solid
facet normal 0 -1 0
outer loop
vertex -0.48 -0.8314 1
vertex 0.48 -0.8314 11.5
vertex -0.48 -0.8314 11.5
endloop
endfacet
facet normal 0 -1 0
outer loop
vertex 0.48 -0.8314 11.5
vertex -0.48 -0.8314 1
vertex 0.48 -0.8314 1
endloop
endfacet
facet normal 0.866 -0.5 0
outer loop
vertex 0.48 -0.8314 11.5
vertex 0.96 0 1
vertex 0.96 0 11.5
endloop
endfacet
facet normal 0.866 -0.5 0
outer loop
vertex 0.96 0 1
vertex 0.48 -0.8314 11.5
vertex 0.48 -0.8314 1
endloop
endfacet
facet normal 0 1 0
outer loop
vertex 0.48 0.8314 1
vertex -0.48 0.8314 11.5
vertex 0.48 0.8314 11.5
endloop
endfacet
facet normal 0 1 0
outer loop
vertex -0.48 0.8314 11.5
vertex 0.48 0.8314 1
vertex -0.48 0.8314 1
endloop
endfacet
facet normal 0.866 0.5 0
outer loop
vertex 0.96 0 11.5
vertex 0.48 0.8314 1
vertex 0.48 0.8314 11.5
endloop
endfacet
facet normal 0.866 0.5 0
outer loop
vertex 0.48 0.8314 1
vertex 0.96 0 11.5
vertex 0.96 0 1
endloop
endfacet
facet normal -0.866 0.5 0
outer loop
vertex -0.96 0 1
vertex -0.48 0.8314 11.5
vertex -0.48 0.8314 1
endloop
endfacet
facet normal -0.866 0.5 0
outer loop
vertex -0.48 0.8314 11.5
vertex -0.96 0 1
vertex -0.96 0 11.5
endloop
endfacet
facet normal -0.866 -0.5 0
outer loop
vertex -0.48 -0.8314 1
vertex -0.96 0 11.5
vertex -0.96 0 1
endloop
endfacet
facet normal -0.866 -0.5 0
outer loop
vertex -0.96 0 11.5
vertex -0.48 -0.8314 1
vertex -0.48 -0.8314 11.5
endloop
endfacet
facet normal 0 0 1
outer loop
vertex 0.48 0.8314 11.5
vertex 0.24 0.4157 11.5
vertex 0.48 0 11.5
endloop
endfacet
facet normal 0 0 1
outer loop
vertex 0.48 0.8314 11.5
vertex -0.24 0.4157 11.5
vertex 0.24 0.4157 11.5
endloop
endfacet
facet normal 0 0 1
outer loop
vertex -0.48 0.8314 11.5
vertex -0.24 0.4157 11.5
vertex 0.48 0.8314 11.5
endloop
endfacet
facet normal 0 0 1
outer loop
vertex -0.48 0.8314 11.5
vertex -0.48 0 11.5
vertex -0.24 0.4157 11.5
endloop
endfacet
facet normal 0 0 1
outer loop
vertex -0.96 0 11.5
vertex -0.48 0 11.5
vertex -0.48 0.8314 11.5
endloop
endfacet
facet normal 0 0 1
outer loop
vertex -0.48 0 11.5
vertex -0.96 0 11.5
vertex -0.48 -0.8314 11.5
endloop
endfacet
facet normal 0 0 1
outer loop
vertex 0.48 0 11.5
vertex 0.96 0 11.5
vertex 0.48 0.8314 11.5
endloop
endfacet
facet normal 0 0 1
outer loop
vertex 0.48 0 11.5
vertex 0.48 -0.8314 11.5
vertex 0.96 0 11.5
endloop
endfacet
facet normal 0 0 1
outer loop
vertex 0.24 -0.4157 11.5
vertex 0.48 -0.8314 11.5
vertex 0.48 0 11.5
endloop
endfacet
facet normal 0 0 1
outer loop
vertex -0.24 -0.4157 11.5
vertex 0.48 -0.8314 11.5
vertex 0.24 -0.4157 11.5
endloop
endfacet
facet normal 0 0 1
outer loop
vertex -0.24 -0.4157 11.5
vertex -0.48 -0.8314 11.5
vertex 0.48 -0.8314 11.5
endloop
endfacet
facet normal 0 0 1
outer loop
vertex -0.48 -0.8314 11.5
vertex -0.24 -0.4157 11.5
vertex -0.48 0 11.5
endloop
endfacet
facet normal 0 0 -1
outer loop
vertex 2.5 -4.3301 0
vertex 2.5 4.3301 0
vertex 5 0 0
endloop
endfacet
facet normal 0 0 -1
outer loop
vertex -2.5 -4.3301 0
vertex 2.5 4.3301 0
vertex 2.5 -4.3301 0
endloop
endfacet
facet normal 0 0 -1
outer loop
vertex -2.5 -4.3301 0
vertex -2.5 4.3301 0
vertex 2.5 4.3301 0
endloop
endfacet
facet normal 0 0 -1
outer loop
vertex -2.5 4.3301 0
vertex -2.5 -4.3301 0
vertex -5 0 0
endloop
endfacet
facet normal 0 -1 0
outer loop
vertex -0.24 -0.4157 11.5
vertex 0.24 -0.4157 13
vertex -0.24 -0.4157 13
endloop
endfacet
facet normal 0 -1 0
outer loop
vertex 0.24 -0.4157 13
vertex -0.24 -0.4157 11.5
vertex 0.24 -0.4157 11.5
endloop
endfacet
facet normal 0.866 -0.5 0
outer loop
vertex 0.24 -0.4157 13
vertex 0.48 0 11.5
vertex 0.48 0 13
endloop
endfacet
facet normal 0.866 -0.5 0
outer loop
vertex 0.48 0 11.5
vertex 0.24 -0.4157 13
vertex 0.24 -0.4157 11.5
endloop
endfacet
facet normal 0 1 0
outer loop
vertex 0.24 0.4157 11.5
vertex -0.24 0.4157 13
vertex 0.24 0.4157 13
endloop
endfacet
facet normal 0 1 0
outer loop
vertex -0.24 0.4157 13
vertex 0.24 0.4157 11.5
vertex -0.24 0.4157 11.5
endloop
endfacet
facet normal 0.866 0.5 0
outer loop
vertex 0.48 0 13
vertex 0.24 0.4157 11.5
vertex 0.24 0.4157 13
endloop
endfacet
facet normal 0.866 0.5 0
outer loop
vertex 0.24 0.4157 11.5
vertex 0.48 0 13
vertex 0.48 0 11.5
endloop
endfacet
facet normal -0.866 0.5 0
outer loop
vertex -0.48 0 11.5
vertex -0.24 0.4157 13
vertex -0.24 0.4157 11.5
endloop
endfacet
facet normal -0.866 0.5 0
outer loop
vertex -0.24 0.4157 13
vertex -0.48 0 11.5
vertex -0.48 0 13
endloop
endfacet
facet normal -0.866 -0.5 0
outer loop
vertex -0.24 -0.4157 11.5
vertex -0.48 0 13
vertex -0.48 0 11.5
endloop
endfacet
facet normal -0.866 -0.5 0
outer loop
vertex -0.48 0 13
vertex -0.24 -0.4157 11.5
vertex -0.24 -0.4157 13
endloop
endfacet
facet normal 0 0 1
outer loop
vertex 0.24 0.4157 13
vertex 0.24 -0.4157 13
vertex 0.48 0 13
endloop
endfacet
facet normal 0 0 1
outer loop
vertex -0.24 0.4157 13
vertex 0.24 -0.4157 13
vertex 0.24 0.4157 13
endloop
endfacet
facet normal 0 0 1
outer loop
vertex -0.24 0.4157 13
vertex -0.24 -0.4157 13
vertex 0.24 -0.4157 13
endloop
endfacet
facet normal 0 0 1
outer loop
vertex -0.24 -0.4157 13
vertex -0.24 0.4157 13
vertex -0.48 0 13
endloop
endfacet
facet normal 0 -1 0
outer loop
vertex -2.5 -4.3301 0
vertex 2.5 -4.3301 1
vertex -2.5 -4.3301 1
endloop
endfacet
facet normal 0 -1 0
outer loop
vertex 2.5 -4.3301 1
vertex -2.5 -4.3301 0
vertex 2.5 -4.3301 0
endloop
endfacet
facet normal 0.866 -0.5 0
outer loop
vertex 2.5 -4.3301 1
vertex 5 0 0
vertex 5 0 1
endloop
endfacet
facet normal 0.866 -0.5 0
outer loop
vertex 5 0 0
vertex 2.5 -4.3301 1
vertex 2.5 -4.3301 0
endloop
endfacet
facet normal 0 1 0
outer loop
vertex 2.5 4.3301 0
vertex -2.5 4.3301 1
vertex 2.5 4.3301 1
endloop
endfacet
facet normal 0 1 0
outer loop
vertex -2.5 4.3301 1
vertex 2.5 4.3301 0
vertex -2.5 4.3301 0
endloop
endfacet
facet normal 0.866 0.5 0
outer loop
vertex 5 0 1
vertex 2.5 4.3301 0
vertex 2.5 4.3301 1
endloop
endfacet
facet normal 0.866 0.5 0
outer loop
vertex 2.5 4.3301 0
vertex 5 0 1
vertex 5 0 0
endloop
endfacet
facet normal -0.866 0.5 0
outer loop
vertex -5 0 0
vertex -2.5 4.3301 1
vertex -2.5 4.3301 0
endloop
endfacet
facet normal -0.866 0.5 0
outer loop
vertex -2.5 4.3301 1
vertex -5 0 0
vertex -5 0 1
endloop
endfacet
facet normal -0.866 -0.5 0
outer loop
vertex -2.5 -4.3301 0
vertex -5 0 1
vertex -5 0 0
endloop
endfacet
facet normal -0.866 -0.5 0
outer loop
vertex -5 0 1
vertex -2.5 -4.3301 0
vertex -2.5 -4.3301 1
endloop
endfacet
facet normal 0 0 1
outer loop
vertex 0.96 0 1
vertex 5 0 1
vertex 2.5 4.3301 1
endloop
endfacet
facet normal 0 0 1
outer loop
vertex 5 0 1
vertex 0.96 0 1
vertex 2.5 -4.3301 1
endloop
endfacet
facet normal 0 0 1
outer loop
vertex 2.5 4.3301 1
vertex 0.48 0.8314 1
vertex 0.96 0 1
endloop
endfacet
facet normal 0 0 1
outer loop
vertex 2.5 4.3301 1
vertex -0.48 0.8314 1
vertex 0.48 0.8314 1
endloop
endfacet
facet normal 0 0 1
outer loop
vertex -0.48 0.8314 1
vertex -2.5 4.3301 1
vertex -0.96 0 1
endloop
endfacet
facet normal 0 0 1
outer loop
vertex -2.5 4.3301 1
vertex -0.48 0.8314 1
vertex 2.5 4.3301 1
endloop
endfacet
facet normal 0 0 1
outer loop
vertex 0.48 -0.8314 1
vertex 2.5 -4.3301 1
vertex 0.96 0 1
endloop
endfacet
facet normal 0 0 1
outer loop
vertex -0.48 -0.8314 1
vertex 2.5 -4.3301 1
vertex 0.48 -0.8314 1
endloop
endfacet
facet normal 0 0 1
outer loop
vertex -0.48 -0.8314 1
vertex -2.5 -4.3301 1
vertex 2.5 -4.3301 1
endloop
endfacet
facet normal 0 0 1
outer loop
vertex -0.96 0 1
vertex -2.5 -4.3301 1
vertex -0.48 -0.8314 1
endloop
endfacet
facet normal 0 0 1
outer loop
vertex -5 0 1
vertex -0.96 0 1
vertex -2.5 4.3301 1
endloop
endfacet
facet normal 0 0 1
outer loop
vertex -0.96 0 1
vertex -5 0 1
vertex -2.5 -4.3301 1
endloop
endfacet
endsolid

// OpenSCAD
// file: cookie_cutter.scad
// Cookie cutter generator
// Pau Fernández <pauek@minidosis.org>
// GNU GPL v2

module dxf(file, layer, height) {
   orig = dxf_cross(file = file, layer = layer);
   echo("origin: ", orig);
   translate([-orig[0], -orig[1], 0])
      linear_extrude(height = height)
         import(file = file, layer = layer);
}

module needle(height, thin1, thin2) {
   union() {
      cylinder(r = thin1, h = height-1.5, $fn = 6);
      cylinder(r = thin2, h = height, $fn = 6);
   }
}

module wall(file, layer, height, thin) {
   difference() {
      minkowski() {
        dxf(file, layer, 0.01);
        cylinder(r = thin, h = height, $fn = 6);
      }
      translate([0, 0, -1]) dxf(file, layer, height + 2);
   }
}

module cutter(file, layer, height, nozzle_diameter) {
   thin1 = nozzle_diameter * 2.4;
   thin2 = nozzle_diameter * 1.2;
   difference() {
      minkowski() {
        dxf(file, layer, 0.01);
        needle(height, thin1, thin2);
      }
      translate([0, 0, -1]) dxf(file, layer, height + 2);
   }
}

module cookie_cutter(file, height, join_height, nozzle_diameter) {
   union () {
      cutter(file, "cutter", height, nozzle_diameter);
      wall(file, "outer", 1, 5);
   }
}

module cookie_cutter_join(file, height, nozzle_diameter) {
   mirror([1, 0, 0]) union () {
      cutter(file, "cutter", height, nozzle_diameter);
      wall(file, "outer", 1.5, 5);
      dxf(file, "join", 1.5);
   }
}
// main file
include <cookie_cutter.scad>;
cookie_cutter("dolphin.dxf", 13, 3.5, 0.4);
